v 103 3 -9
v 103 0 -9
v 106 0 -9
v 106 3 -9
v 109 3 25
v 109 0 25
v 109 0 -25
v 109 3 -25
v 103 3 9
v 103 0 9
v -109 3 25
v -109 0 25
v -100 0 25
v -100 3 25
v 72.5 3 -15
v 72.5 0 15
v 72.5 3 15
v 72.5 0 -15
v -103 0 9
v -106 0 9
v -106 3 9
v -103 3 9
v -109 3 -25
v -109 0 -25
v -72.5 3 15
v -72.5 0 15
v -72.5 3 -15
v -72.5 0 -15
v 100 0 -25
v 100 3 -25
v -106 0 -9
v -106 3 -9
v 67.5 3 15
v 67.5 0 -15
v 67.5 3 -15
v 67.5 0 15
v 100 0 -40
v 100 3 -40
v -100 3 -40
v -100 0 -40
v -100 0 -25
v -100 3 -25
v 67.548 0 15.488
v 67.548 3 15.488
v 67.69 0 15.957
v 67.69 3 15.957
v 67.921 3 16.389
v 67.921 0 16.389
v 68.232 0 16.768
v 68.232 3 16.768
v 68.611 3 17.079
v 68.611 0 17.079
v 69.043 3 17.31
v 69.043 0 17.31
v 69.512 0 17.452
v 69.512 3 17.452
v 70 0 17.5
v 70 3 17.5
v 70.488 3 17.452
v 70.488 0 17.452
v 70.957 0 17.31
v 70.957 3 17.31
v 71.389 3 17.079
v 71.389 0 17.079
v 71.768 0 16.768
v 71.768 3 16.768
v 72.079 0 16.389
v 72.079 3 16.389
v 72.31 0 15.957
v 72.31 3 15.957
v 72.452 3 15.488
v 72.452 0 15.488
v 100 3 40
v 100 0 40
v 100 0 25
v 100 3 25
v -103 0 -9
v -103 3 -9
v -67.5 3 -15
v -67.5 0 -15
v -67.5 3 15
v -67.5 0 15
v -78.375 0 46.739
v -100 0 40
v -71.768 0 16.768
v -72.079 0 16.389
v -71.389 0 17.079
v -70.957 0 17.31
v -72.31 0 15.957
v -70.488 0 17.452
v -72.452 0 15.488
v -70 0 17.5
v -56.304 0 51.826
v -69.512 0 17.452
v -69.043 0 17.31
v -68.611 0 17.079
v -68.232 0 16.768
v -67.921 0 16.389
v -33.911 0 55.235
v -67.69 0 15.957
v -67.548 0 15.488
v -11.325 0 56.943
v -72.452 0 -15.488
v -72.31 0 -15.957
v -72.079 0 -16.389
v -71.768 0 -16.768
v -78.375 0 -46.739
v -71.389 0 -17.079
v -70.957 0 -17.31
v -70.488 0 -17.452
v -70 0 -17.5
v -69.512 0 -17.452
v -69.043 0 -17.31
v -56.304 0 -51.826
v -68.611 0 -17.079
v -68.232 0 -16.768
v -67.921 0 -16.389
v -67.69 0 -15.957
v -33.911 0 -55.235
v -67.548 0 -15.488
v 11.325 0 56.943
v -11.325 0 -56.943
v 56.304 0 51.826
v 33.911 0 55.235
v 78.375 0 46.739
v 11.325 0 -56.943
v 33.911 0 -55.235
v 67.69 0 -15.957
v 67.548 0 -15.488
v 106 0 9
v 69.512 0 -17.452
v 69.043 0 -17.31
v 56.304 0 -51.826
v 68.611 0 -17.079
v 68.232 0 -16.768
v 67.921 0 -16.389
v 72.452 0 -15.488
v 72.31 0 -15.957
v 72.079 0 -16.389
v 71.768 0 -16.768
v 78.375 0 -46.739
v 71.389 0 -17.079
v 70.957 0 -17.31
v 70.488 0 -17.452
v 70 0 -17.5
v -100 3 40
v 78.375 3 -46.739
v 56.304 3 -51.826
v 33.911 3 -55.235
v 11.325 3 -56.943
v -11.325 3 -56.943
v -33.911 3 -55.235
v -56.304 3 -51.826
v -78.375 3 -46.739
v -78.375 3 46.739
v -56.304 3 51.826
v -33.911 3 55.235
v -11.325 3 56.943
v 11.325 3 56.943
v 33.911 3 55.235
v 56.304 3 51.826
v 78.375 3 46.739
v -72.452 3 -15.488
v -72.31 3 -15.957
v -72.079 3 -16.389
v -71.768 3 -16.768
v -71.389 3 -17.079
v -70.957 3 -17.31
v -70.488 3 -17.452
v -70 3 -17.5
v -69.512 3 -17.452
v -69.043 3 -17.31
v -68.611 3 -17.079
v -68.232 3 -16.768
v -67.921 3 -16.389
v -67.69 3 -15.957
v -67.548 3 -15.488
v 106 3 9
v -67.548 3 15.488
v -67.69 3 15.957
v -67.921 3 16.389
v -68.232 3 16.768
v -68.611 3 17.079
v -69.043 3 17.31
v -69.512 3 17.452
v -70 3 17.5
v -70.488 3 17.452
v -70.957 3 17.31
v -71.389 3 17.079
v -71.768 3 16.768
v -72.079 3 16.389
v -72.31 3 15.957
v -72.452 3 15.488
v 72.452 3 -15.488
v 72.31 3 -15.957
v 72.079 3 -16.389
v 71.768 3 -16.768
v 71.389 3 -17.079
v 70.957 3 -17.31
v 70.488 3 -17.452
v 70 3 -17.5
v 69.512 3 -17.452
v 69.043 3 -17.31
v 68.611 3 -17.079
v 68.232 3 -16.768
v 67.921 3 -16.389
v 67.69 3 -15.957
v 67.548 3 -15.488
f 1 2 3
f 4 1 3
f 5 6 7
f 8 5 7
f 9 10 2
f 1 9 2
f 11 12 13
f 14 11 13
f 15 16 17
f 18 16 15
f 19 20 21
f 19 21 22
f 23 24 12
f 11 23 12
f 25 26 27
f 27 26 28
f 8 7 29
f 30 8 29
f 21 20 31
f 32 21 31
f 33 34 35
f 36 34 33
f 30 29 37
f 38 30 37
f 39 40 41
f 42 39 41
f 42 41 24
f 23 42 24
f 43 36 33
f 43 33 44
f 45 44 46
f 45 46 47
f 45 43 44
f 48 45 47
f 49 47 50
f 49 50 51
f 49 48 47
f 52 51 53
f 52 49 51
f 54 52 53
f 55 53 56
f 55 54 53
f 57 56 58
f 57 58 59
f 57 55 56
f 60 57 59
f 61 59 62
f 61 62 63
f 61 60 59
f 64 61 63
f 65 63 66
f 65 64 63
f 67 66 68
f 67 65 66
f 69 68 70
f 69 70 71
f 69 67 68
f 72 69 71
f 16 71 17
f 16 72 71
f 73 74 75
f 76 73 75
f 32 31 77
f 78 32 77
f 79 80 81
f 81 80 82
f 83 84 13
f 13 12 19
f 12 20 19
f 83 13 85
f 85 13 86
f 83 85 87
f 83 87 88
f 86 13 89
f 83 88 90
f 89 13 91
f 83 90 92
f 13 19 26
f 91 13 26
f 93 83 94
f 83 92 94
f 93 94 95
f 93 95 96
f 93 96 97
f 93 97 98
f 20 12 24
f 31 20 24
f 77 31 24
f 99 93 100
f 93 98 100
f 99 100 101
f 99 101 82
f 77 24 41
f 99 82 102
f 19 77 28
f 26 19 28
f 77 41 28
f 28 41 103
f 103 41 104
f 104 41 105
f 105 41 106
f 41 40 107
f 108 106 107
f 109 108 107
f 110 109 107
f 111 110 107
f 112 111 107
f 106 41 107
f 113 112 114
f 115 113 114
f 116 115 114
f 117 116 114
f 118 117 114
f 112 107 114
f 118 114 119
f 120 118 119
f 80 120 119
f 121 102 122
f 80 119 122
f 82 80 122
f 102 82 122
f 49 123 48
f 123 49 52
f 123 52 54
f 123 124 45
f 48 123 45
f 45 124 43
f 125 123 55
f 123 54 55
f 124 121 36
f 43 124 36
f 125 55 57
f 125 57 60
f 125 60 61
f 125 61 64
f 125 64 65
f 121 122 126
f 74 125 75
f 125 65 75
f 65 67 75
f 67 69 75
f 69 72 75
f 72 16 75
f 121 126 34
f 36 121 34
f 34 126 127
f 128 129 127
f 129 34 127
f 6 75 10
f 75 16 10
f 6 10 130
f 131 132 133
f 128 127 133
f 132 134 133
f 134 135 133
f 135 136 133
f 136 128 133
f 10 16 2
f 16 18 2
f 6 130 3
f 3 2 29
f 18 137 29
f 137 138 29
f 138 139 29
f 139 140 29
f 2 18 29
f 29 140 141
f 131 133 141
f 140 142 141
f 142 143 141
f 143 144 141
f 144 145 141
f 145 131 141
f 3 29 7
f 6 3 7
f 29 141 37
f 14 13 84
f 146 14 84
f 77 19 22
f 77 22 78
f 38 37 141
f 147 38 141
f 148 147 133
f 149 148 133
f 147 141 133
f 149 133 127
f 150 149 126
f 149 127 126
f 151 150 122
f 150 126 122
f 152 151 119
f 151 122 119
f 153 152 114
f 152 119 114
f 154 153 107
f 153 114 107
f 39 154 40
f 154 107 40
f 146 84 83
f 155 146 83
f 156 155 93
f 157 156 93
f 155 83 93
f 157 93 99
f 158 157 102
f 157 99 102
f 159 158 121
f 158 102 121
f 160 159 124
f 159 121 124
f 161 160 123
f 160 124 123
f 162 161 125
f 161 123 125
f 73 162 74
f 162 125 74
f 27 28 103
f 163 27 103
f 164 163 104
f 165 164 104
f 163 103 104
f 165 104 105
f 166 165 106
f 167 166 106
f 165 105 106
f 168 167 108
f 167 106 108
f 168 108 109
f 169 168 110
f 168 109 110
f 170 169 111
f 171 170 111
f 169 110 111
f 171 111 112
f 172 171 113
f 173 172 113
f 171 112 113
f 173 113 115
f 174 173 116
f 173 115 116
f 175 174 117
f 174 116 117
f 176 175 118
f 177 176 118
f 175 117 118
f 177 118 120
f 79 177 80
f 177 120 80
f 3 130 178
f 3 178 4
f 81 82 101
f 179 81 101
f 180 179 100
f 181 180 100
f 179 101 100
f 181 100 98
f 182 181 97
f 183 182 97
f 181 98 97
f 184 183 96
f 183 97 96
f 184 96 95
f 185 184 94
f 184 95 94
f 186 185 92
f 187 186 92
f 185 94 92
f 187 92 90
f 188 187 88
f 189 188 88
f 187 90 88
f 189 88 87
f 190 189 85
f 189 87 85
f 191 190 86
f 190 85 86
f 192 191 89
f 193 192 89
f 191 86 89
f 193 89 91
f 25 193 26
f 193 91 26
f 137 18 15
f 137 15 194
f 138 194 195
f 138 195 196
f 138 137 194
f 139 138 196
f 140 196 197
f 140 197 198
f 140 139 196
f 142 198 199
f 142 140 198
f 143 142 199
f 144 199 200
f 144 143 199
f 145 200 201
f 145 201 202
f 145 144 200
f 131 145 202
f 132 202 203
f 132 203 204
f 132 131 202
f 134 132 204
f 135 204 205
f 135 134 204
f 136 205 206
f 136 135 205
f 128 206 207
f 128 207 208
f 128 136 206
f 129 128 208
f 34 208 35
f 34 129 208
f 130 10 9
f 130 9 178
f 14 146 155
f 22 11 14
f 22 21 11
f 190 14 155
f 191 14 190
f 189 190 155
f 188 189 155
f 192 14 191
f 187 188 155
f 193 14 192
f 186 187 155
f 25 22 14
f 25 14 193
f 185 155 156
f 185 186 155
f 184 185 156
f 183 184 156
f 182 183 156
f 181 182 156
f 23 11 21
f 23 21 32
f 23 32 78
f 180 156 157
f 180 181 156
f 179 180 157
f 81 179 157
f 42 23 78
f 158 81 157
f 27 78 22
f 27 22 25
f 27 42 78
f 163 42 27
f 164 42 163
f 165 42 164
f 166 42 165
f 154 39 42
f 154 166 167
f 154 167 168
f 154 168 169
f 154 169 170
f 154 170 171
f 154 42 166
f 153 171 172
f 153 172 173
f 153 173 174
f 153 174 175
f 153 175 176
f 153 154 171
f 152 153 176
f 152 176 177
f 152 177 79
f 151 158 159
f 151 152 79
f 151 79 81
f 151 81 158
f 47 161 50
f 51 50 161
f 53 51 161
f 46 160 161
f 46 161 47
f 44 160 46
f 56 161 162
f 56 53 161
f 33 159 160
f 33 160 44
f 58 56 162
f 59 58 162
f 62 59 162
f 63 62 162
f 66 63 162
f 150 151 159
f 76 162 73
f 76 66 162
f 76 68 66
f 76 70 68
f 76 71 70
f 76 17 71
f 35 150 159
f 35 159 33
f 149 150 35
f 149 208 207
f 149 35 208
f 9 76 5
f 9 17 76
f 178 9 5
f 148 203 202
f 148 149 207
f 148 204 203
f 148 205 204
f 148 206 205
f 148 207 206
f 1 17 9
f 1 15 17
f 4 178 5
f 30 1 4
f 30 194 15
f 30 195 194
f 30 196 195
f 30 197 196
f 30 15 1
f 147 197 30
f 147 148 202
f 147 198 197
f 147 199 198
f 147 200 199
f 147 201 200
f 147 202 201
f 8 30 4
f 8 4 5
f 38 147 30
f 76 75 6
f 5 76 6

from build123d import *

# Parameters (mm, degrees)
SKETCH1_W           = 3
SKETCH1_H           = 18
BOSS_EXTRUDE1_DEPTH = 3


with BuildPart() as part:
    # Sketch1 → Boss-Extrude1 (new body)
    with BuildSketch(Plane(origin=(0, 0, 0), x_dir=(1, 0, 0), z_dir=(0, 1, 0))):
        with BuildLine():
            Line((-100, 40), (-100, 25))
            Line((-100, 25), (-109, 25))
            Line((-109, 25), (-109, -25))
            Line((-109, -25), (-100, -25))
            Line((-100, -25), (-100, -40))
            ThreePointArc((-100, -40), (0, -57.157287525), (100, -40))
            Line((100, -40), (100, -25))
            Line((100, -25), (109, -25))
            Line((109, -25), (109, 25))
            Line((109, 25), (100, 25))
            Line((100, 25), (100, 40))
            ThreePointArc((100, 40), (0, 57.157287525), (-100, 40))
        make_face()
        with Locations((104.5, 0)):
            Rectangle(SKETCH1_W, SKETCH1_H, mode=Mode.SUBTRACT)
        with Locations((-104.5, 0)):
            Rectangle(SKETCH1_W, SKETCH1_H, mode=Mode.SUBTRACT)
        with BuildLine():
            Line((-72.5, -15), (-72.5, 15))
            ThreePointArc((-72.5, 15), (-70, 17.5), (-67.5, 15))
            Line((-67.5, 15), (-67.5, -15))
            ThreePointArc((-67.5, -15), (-70, -17.5), (-72.5, -15))
        make_face(mode=Mode.SUBTRACT)
        with BuildLine():
            Line((72.5, -15), (72.5, 15))
            ThreePointArc((72.5, 15), (70, 17.5), (67.5, 15))
            Line((67.5, 15), (67.5, -15))
            ThreePointArc((67.5, -15), (70, -17.5), (72.5, -15))
        make_face(mode=Mode.SUBTRACT)
    extrude(amount=BOSS_EXTRUDE1_DEPTH)


solid = part.part
